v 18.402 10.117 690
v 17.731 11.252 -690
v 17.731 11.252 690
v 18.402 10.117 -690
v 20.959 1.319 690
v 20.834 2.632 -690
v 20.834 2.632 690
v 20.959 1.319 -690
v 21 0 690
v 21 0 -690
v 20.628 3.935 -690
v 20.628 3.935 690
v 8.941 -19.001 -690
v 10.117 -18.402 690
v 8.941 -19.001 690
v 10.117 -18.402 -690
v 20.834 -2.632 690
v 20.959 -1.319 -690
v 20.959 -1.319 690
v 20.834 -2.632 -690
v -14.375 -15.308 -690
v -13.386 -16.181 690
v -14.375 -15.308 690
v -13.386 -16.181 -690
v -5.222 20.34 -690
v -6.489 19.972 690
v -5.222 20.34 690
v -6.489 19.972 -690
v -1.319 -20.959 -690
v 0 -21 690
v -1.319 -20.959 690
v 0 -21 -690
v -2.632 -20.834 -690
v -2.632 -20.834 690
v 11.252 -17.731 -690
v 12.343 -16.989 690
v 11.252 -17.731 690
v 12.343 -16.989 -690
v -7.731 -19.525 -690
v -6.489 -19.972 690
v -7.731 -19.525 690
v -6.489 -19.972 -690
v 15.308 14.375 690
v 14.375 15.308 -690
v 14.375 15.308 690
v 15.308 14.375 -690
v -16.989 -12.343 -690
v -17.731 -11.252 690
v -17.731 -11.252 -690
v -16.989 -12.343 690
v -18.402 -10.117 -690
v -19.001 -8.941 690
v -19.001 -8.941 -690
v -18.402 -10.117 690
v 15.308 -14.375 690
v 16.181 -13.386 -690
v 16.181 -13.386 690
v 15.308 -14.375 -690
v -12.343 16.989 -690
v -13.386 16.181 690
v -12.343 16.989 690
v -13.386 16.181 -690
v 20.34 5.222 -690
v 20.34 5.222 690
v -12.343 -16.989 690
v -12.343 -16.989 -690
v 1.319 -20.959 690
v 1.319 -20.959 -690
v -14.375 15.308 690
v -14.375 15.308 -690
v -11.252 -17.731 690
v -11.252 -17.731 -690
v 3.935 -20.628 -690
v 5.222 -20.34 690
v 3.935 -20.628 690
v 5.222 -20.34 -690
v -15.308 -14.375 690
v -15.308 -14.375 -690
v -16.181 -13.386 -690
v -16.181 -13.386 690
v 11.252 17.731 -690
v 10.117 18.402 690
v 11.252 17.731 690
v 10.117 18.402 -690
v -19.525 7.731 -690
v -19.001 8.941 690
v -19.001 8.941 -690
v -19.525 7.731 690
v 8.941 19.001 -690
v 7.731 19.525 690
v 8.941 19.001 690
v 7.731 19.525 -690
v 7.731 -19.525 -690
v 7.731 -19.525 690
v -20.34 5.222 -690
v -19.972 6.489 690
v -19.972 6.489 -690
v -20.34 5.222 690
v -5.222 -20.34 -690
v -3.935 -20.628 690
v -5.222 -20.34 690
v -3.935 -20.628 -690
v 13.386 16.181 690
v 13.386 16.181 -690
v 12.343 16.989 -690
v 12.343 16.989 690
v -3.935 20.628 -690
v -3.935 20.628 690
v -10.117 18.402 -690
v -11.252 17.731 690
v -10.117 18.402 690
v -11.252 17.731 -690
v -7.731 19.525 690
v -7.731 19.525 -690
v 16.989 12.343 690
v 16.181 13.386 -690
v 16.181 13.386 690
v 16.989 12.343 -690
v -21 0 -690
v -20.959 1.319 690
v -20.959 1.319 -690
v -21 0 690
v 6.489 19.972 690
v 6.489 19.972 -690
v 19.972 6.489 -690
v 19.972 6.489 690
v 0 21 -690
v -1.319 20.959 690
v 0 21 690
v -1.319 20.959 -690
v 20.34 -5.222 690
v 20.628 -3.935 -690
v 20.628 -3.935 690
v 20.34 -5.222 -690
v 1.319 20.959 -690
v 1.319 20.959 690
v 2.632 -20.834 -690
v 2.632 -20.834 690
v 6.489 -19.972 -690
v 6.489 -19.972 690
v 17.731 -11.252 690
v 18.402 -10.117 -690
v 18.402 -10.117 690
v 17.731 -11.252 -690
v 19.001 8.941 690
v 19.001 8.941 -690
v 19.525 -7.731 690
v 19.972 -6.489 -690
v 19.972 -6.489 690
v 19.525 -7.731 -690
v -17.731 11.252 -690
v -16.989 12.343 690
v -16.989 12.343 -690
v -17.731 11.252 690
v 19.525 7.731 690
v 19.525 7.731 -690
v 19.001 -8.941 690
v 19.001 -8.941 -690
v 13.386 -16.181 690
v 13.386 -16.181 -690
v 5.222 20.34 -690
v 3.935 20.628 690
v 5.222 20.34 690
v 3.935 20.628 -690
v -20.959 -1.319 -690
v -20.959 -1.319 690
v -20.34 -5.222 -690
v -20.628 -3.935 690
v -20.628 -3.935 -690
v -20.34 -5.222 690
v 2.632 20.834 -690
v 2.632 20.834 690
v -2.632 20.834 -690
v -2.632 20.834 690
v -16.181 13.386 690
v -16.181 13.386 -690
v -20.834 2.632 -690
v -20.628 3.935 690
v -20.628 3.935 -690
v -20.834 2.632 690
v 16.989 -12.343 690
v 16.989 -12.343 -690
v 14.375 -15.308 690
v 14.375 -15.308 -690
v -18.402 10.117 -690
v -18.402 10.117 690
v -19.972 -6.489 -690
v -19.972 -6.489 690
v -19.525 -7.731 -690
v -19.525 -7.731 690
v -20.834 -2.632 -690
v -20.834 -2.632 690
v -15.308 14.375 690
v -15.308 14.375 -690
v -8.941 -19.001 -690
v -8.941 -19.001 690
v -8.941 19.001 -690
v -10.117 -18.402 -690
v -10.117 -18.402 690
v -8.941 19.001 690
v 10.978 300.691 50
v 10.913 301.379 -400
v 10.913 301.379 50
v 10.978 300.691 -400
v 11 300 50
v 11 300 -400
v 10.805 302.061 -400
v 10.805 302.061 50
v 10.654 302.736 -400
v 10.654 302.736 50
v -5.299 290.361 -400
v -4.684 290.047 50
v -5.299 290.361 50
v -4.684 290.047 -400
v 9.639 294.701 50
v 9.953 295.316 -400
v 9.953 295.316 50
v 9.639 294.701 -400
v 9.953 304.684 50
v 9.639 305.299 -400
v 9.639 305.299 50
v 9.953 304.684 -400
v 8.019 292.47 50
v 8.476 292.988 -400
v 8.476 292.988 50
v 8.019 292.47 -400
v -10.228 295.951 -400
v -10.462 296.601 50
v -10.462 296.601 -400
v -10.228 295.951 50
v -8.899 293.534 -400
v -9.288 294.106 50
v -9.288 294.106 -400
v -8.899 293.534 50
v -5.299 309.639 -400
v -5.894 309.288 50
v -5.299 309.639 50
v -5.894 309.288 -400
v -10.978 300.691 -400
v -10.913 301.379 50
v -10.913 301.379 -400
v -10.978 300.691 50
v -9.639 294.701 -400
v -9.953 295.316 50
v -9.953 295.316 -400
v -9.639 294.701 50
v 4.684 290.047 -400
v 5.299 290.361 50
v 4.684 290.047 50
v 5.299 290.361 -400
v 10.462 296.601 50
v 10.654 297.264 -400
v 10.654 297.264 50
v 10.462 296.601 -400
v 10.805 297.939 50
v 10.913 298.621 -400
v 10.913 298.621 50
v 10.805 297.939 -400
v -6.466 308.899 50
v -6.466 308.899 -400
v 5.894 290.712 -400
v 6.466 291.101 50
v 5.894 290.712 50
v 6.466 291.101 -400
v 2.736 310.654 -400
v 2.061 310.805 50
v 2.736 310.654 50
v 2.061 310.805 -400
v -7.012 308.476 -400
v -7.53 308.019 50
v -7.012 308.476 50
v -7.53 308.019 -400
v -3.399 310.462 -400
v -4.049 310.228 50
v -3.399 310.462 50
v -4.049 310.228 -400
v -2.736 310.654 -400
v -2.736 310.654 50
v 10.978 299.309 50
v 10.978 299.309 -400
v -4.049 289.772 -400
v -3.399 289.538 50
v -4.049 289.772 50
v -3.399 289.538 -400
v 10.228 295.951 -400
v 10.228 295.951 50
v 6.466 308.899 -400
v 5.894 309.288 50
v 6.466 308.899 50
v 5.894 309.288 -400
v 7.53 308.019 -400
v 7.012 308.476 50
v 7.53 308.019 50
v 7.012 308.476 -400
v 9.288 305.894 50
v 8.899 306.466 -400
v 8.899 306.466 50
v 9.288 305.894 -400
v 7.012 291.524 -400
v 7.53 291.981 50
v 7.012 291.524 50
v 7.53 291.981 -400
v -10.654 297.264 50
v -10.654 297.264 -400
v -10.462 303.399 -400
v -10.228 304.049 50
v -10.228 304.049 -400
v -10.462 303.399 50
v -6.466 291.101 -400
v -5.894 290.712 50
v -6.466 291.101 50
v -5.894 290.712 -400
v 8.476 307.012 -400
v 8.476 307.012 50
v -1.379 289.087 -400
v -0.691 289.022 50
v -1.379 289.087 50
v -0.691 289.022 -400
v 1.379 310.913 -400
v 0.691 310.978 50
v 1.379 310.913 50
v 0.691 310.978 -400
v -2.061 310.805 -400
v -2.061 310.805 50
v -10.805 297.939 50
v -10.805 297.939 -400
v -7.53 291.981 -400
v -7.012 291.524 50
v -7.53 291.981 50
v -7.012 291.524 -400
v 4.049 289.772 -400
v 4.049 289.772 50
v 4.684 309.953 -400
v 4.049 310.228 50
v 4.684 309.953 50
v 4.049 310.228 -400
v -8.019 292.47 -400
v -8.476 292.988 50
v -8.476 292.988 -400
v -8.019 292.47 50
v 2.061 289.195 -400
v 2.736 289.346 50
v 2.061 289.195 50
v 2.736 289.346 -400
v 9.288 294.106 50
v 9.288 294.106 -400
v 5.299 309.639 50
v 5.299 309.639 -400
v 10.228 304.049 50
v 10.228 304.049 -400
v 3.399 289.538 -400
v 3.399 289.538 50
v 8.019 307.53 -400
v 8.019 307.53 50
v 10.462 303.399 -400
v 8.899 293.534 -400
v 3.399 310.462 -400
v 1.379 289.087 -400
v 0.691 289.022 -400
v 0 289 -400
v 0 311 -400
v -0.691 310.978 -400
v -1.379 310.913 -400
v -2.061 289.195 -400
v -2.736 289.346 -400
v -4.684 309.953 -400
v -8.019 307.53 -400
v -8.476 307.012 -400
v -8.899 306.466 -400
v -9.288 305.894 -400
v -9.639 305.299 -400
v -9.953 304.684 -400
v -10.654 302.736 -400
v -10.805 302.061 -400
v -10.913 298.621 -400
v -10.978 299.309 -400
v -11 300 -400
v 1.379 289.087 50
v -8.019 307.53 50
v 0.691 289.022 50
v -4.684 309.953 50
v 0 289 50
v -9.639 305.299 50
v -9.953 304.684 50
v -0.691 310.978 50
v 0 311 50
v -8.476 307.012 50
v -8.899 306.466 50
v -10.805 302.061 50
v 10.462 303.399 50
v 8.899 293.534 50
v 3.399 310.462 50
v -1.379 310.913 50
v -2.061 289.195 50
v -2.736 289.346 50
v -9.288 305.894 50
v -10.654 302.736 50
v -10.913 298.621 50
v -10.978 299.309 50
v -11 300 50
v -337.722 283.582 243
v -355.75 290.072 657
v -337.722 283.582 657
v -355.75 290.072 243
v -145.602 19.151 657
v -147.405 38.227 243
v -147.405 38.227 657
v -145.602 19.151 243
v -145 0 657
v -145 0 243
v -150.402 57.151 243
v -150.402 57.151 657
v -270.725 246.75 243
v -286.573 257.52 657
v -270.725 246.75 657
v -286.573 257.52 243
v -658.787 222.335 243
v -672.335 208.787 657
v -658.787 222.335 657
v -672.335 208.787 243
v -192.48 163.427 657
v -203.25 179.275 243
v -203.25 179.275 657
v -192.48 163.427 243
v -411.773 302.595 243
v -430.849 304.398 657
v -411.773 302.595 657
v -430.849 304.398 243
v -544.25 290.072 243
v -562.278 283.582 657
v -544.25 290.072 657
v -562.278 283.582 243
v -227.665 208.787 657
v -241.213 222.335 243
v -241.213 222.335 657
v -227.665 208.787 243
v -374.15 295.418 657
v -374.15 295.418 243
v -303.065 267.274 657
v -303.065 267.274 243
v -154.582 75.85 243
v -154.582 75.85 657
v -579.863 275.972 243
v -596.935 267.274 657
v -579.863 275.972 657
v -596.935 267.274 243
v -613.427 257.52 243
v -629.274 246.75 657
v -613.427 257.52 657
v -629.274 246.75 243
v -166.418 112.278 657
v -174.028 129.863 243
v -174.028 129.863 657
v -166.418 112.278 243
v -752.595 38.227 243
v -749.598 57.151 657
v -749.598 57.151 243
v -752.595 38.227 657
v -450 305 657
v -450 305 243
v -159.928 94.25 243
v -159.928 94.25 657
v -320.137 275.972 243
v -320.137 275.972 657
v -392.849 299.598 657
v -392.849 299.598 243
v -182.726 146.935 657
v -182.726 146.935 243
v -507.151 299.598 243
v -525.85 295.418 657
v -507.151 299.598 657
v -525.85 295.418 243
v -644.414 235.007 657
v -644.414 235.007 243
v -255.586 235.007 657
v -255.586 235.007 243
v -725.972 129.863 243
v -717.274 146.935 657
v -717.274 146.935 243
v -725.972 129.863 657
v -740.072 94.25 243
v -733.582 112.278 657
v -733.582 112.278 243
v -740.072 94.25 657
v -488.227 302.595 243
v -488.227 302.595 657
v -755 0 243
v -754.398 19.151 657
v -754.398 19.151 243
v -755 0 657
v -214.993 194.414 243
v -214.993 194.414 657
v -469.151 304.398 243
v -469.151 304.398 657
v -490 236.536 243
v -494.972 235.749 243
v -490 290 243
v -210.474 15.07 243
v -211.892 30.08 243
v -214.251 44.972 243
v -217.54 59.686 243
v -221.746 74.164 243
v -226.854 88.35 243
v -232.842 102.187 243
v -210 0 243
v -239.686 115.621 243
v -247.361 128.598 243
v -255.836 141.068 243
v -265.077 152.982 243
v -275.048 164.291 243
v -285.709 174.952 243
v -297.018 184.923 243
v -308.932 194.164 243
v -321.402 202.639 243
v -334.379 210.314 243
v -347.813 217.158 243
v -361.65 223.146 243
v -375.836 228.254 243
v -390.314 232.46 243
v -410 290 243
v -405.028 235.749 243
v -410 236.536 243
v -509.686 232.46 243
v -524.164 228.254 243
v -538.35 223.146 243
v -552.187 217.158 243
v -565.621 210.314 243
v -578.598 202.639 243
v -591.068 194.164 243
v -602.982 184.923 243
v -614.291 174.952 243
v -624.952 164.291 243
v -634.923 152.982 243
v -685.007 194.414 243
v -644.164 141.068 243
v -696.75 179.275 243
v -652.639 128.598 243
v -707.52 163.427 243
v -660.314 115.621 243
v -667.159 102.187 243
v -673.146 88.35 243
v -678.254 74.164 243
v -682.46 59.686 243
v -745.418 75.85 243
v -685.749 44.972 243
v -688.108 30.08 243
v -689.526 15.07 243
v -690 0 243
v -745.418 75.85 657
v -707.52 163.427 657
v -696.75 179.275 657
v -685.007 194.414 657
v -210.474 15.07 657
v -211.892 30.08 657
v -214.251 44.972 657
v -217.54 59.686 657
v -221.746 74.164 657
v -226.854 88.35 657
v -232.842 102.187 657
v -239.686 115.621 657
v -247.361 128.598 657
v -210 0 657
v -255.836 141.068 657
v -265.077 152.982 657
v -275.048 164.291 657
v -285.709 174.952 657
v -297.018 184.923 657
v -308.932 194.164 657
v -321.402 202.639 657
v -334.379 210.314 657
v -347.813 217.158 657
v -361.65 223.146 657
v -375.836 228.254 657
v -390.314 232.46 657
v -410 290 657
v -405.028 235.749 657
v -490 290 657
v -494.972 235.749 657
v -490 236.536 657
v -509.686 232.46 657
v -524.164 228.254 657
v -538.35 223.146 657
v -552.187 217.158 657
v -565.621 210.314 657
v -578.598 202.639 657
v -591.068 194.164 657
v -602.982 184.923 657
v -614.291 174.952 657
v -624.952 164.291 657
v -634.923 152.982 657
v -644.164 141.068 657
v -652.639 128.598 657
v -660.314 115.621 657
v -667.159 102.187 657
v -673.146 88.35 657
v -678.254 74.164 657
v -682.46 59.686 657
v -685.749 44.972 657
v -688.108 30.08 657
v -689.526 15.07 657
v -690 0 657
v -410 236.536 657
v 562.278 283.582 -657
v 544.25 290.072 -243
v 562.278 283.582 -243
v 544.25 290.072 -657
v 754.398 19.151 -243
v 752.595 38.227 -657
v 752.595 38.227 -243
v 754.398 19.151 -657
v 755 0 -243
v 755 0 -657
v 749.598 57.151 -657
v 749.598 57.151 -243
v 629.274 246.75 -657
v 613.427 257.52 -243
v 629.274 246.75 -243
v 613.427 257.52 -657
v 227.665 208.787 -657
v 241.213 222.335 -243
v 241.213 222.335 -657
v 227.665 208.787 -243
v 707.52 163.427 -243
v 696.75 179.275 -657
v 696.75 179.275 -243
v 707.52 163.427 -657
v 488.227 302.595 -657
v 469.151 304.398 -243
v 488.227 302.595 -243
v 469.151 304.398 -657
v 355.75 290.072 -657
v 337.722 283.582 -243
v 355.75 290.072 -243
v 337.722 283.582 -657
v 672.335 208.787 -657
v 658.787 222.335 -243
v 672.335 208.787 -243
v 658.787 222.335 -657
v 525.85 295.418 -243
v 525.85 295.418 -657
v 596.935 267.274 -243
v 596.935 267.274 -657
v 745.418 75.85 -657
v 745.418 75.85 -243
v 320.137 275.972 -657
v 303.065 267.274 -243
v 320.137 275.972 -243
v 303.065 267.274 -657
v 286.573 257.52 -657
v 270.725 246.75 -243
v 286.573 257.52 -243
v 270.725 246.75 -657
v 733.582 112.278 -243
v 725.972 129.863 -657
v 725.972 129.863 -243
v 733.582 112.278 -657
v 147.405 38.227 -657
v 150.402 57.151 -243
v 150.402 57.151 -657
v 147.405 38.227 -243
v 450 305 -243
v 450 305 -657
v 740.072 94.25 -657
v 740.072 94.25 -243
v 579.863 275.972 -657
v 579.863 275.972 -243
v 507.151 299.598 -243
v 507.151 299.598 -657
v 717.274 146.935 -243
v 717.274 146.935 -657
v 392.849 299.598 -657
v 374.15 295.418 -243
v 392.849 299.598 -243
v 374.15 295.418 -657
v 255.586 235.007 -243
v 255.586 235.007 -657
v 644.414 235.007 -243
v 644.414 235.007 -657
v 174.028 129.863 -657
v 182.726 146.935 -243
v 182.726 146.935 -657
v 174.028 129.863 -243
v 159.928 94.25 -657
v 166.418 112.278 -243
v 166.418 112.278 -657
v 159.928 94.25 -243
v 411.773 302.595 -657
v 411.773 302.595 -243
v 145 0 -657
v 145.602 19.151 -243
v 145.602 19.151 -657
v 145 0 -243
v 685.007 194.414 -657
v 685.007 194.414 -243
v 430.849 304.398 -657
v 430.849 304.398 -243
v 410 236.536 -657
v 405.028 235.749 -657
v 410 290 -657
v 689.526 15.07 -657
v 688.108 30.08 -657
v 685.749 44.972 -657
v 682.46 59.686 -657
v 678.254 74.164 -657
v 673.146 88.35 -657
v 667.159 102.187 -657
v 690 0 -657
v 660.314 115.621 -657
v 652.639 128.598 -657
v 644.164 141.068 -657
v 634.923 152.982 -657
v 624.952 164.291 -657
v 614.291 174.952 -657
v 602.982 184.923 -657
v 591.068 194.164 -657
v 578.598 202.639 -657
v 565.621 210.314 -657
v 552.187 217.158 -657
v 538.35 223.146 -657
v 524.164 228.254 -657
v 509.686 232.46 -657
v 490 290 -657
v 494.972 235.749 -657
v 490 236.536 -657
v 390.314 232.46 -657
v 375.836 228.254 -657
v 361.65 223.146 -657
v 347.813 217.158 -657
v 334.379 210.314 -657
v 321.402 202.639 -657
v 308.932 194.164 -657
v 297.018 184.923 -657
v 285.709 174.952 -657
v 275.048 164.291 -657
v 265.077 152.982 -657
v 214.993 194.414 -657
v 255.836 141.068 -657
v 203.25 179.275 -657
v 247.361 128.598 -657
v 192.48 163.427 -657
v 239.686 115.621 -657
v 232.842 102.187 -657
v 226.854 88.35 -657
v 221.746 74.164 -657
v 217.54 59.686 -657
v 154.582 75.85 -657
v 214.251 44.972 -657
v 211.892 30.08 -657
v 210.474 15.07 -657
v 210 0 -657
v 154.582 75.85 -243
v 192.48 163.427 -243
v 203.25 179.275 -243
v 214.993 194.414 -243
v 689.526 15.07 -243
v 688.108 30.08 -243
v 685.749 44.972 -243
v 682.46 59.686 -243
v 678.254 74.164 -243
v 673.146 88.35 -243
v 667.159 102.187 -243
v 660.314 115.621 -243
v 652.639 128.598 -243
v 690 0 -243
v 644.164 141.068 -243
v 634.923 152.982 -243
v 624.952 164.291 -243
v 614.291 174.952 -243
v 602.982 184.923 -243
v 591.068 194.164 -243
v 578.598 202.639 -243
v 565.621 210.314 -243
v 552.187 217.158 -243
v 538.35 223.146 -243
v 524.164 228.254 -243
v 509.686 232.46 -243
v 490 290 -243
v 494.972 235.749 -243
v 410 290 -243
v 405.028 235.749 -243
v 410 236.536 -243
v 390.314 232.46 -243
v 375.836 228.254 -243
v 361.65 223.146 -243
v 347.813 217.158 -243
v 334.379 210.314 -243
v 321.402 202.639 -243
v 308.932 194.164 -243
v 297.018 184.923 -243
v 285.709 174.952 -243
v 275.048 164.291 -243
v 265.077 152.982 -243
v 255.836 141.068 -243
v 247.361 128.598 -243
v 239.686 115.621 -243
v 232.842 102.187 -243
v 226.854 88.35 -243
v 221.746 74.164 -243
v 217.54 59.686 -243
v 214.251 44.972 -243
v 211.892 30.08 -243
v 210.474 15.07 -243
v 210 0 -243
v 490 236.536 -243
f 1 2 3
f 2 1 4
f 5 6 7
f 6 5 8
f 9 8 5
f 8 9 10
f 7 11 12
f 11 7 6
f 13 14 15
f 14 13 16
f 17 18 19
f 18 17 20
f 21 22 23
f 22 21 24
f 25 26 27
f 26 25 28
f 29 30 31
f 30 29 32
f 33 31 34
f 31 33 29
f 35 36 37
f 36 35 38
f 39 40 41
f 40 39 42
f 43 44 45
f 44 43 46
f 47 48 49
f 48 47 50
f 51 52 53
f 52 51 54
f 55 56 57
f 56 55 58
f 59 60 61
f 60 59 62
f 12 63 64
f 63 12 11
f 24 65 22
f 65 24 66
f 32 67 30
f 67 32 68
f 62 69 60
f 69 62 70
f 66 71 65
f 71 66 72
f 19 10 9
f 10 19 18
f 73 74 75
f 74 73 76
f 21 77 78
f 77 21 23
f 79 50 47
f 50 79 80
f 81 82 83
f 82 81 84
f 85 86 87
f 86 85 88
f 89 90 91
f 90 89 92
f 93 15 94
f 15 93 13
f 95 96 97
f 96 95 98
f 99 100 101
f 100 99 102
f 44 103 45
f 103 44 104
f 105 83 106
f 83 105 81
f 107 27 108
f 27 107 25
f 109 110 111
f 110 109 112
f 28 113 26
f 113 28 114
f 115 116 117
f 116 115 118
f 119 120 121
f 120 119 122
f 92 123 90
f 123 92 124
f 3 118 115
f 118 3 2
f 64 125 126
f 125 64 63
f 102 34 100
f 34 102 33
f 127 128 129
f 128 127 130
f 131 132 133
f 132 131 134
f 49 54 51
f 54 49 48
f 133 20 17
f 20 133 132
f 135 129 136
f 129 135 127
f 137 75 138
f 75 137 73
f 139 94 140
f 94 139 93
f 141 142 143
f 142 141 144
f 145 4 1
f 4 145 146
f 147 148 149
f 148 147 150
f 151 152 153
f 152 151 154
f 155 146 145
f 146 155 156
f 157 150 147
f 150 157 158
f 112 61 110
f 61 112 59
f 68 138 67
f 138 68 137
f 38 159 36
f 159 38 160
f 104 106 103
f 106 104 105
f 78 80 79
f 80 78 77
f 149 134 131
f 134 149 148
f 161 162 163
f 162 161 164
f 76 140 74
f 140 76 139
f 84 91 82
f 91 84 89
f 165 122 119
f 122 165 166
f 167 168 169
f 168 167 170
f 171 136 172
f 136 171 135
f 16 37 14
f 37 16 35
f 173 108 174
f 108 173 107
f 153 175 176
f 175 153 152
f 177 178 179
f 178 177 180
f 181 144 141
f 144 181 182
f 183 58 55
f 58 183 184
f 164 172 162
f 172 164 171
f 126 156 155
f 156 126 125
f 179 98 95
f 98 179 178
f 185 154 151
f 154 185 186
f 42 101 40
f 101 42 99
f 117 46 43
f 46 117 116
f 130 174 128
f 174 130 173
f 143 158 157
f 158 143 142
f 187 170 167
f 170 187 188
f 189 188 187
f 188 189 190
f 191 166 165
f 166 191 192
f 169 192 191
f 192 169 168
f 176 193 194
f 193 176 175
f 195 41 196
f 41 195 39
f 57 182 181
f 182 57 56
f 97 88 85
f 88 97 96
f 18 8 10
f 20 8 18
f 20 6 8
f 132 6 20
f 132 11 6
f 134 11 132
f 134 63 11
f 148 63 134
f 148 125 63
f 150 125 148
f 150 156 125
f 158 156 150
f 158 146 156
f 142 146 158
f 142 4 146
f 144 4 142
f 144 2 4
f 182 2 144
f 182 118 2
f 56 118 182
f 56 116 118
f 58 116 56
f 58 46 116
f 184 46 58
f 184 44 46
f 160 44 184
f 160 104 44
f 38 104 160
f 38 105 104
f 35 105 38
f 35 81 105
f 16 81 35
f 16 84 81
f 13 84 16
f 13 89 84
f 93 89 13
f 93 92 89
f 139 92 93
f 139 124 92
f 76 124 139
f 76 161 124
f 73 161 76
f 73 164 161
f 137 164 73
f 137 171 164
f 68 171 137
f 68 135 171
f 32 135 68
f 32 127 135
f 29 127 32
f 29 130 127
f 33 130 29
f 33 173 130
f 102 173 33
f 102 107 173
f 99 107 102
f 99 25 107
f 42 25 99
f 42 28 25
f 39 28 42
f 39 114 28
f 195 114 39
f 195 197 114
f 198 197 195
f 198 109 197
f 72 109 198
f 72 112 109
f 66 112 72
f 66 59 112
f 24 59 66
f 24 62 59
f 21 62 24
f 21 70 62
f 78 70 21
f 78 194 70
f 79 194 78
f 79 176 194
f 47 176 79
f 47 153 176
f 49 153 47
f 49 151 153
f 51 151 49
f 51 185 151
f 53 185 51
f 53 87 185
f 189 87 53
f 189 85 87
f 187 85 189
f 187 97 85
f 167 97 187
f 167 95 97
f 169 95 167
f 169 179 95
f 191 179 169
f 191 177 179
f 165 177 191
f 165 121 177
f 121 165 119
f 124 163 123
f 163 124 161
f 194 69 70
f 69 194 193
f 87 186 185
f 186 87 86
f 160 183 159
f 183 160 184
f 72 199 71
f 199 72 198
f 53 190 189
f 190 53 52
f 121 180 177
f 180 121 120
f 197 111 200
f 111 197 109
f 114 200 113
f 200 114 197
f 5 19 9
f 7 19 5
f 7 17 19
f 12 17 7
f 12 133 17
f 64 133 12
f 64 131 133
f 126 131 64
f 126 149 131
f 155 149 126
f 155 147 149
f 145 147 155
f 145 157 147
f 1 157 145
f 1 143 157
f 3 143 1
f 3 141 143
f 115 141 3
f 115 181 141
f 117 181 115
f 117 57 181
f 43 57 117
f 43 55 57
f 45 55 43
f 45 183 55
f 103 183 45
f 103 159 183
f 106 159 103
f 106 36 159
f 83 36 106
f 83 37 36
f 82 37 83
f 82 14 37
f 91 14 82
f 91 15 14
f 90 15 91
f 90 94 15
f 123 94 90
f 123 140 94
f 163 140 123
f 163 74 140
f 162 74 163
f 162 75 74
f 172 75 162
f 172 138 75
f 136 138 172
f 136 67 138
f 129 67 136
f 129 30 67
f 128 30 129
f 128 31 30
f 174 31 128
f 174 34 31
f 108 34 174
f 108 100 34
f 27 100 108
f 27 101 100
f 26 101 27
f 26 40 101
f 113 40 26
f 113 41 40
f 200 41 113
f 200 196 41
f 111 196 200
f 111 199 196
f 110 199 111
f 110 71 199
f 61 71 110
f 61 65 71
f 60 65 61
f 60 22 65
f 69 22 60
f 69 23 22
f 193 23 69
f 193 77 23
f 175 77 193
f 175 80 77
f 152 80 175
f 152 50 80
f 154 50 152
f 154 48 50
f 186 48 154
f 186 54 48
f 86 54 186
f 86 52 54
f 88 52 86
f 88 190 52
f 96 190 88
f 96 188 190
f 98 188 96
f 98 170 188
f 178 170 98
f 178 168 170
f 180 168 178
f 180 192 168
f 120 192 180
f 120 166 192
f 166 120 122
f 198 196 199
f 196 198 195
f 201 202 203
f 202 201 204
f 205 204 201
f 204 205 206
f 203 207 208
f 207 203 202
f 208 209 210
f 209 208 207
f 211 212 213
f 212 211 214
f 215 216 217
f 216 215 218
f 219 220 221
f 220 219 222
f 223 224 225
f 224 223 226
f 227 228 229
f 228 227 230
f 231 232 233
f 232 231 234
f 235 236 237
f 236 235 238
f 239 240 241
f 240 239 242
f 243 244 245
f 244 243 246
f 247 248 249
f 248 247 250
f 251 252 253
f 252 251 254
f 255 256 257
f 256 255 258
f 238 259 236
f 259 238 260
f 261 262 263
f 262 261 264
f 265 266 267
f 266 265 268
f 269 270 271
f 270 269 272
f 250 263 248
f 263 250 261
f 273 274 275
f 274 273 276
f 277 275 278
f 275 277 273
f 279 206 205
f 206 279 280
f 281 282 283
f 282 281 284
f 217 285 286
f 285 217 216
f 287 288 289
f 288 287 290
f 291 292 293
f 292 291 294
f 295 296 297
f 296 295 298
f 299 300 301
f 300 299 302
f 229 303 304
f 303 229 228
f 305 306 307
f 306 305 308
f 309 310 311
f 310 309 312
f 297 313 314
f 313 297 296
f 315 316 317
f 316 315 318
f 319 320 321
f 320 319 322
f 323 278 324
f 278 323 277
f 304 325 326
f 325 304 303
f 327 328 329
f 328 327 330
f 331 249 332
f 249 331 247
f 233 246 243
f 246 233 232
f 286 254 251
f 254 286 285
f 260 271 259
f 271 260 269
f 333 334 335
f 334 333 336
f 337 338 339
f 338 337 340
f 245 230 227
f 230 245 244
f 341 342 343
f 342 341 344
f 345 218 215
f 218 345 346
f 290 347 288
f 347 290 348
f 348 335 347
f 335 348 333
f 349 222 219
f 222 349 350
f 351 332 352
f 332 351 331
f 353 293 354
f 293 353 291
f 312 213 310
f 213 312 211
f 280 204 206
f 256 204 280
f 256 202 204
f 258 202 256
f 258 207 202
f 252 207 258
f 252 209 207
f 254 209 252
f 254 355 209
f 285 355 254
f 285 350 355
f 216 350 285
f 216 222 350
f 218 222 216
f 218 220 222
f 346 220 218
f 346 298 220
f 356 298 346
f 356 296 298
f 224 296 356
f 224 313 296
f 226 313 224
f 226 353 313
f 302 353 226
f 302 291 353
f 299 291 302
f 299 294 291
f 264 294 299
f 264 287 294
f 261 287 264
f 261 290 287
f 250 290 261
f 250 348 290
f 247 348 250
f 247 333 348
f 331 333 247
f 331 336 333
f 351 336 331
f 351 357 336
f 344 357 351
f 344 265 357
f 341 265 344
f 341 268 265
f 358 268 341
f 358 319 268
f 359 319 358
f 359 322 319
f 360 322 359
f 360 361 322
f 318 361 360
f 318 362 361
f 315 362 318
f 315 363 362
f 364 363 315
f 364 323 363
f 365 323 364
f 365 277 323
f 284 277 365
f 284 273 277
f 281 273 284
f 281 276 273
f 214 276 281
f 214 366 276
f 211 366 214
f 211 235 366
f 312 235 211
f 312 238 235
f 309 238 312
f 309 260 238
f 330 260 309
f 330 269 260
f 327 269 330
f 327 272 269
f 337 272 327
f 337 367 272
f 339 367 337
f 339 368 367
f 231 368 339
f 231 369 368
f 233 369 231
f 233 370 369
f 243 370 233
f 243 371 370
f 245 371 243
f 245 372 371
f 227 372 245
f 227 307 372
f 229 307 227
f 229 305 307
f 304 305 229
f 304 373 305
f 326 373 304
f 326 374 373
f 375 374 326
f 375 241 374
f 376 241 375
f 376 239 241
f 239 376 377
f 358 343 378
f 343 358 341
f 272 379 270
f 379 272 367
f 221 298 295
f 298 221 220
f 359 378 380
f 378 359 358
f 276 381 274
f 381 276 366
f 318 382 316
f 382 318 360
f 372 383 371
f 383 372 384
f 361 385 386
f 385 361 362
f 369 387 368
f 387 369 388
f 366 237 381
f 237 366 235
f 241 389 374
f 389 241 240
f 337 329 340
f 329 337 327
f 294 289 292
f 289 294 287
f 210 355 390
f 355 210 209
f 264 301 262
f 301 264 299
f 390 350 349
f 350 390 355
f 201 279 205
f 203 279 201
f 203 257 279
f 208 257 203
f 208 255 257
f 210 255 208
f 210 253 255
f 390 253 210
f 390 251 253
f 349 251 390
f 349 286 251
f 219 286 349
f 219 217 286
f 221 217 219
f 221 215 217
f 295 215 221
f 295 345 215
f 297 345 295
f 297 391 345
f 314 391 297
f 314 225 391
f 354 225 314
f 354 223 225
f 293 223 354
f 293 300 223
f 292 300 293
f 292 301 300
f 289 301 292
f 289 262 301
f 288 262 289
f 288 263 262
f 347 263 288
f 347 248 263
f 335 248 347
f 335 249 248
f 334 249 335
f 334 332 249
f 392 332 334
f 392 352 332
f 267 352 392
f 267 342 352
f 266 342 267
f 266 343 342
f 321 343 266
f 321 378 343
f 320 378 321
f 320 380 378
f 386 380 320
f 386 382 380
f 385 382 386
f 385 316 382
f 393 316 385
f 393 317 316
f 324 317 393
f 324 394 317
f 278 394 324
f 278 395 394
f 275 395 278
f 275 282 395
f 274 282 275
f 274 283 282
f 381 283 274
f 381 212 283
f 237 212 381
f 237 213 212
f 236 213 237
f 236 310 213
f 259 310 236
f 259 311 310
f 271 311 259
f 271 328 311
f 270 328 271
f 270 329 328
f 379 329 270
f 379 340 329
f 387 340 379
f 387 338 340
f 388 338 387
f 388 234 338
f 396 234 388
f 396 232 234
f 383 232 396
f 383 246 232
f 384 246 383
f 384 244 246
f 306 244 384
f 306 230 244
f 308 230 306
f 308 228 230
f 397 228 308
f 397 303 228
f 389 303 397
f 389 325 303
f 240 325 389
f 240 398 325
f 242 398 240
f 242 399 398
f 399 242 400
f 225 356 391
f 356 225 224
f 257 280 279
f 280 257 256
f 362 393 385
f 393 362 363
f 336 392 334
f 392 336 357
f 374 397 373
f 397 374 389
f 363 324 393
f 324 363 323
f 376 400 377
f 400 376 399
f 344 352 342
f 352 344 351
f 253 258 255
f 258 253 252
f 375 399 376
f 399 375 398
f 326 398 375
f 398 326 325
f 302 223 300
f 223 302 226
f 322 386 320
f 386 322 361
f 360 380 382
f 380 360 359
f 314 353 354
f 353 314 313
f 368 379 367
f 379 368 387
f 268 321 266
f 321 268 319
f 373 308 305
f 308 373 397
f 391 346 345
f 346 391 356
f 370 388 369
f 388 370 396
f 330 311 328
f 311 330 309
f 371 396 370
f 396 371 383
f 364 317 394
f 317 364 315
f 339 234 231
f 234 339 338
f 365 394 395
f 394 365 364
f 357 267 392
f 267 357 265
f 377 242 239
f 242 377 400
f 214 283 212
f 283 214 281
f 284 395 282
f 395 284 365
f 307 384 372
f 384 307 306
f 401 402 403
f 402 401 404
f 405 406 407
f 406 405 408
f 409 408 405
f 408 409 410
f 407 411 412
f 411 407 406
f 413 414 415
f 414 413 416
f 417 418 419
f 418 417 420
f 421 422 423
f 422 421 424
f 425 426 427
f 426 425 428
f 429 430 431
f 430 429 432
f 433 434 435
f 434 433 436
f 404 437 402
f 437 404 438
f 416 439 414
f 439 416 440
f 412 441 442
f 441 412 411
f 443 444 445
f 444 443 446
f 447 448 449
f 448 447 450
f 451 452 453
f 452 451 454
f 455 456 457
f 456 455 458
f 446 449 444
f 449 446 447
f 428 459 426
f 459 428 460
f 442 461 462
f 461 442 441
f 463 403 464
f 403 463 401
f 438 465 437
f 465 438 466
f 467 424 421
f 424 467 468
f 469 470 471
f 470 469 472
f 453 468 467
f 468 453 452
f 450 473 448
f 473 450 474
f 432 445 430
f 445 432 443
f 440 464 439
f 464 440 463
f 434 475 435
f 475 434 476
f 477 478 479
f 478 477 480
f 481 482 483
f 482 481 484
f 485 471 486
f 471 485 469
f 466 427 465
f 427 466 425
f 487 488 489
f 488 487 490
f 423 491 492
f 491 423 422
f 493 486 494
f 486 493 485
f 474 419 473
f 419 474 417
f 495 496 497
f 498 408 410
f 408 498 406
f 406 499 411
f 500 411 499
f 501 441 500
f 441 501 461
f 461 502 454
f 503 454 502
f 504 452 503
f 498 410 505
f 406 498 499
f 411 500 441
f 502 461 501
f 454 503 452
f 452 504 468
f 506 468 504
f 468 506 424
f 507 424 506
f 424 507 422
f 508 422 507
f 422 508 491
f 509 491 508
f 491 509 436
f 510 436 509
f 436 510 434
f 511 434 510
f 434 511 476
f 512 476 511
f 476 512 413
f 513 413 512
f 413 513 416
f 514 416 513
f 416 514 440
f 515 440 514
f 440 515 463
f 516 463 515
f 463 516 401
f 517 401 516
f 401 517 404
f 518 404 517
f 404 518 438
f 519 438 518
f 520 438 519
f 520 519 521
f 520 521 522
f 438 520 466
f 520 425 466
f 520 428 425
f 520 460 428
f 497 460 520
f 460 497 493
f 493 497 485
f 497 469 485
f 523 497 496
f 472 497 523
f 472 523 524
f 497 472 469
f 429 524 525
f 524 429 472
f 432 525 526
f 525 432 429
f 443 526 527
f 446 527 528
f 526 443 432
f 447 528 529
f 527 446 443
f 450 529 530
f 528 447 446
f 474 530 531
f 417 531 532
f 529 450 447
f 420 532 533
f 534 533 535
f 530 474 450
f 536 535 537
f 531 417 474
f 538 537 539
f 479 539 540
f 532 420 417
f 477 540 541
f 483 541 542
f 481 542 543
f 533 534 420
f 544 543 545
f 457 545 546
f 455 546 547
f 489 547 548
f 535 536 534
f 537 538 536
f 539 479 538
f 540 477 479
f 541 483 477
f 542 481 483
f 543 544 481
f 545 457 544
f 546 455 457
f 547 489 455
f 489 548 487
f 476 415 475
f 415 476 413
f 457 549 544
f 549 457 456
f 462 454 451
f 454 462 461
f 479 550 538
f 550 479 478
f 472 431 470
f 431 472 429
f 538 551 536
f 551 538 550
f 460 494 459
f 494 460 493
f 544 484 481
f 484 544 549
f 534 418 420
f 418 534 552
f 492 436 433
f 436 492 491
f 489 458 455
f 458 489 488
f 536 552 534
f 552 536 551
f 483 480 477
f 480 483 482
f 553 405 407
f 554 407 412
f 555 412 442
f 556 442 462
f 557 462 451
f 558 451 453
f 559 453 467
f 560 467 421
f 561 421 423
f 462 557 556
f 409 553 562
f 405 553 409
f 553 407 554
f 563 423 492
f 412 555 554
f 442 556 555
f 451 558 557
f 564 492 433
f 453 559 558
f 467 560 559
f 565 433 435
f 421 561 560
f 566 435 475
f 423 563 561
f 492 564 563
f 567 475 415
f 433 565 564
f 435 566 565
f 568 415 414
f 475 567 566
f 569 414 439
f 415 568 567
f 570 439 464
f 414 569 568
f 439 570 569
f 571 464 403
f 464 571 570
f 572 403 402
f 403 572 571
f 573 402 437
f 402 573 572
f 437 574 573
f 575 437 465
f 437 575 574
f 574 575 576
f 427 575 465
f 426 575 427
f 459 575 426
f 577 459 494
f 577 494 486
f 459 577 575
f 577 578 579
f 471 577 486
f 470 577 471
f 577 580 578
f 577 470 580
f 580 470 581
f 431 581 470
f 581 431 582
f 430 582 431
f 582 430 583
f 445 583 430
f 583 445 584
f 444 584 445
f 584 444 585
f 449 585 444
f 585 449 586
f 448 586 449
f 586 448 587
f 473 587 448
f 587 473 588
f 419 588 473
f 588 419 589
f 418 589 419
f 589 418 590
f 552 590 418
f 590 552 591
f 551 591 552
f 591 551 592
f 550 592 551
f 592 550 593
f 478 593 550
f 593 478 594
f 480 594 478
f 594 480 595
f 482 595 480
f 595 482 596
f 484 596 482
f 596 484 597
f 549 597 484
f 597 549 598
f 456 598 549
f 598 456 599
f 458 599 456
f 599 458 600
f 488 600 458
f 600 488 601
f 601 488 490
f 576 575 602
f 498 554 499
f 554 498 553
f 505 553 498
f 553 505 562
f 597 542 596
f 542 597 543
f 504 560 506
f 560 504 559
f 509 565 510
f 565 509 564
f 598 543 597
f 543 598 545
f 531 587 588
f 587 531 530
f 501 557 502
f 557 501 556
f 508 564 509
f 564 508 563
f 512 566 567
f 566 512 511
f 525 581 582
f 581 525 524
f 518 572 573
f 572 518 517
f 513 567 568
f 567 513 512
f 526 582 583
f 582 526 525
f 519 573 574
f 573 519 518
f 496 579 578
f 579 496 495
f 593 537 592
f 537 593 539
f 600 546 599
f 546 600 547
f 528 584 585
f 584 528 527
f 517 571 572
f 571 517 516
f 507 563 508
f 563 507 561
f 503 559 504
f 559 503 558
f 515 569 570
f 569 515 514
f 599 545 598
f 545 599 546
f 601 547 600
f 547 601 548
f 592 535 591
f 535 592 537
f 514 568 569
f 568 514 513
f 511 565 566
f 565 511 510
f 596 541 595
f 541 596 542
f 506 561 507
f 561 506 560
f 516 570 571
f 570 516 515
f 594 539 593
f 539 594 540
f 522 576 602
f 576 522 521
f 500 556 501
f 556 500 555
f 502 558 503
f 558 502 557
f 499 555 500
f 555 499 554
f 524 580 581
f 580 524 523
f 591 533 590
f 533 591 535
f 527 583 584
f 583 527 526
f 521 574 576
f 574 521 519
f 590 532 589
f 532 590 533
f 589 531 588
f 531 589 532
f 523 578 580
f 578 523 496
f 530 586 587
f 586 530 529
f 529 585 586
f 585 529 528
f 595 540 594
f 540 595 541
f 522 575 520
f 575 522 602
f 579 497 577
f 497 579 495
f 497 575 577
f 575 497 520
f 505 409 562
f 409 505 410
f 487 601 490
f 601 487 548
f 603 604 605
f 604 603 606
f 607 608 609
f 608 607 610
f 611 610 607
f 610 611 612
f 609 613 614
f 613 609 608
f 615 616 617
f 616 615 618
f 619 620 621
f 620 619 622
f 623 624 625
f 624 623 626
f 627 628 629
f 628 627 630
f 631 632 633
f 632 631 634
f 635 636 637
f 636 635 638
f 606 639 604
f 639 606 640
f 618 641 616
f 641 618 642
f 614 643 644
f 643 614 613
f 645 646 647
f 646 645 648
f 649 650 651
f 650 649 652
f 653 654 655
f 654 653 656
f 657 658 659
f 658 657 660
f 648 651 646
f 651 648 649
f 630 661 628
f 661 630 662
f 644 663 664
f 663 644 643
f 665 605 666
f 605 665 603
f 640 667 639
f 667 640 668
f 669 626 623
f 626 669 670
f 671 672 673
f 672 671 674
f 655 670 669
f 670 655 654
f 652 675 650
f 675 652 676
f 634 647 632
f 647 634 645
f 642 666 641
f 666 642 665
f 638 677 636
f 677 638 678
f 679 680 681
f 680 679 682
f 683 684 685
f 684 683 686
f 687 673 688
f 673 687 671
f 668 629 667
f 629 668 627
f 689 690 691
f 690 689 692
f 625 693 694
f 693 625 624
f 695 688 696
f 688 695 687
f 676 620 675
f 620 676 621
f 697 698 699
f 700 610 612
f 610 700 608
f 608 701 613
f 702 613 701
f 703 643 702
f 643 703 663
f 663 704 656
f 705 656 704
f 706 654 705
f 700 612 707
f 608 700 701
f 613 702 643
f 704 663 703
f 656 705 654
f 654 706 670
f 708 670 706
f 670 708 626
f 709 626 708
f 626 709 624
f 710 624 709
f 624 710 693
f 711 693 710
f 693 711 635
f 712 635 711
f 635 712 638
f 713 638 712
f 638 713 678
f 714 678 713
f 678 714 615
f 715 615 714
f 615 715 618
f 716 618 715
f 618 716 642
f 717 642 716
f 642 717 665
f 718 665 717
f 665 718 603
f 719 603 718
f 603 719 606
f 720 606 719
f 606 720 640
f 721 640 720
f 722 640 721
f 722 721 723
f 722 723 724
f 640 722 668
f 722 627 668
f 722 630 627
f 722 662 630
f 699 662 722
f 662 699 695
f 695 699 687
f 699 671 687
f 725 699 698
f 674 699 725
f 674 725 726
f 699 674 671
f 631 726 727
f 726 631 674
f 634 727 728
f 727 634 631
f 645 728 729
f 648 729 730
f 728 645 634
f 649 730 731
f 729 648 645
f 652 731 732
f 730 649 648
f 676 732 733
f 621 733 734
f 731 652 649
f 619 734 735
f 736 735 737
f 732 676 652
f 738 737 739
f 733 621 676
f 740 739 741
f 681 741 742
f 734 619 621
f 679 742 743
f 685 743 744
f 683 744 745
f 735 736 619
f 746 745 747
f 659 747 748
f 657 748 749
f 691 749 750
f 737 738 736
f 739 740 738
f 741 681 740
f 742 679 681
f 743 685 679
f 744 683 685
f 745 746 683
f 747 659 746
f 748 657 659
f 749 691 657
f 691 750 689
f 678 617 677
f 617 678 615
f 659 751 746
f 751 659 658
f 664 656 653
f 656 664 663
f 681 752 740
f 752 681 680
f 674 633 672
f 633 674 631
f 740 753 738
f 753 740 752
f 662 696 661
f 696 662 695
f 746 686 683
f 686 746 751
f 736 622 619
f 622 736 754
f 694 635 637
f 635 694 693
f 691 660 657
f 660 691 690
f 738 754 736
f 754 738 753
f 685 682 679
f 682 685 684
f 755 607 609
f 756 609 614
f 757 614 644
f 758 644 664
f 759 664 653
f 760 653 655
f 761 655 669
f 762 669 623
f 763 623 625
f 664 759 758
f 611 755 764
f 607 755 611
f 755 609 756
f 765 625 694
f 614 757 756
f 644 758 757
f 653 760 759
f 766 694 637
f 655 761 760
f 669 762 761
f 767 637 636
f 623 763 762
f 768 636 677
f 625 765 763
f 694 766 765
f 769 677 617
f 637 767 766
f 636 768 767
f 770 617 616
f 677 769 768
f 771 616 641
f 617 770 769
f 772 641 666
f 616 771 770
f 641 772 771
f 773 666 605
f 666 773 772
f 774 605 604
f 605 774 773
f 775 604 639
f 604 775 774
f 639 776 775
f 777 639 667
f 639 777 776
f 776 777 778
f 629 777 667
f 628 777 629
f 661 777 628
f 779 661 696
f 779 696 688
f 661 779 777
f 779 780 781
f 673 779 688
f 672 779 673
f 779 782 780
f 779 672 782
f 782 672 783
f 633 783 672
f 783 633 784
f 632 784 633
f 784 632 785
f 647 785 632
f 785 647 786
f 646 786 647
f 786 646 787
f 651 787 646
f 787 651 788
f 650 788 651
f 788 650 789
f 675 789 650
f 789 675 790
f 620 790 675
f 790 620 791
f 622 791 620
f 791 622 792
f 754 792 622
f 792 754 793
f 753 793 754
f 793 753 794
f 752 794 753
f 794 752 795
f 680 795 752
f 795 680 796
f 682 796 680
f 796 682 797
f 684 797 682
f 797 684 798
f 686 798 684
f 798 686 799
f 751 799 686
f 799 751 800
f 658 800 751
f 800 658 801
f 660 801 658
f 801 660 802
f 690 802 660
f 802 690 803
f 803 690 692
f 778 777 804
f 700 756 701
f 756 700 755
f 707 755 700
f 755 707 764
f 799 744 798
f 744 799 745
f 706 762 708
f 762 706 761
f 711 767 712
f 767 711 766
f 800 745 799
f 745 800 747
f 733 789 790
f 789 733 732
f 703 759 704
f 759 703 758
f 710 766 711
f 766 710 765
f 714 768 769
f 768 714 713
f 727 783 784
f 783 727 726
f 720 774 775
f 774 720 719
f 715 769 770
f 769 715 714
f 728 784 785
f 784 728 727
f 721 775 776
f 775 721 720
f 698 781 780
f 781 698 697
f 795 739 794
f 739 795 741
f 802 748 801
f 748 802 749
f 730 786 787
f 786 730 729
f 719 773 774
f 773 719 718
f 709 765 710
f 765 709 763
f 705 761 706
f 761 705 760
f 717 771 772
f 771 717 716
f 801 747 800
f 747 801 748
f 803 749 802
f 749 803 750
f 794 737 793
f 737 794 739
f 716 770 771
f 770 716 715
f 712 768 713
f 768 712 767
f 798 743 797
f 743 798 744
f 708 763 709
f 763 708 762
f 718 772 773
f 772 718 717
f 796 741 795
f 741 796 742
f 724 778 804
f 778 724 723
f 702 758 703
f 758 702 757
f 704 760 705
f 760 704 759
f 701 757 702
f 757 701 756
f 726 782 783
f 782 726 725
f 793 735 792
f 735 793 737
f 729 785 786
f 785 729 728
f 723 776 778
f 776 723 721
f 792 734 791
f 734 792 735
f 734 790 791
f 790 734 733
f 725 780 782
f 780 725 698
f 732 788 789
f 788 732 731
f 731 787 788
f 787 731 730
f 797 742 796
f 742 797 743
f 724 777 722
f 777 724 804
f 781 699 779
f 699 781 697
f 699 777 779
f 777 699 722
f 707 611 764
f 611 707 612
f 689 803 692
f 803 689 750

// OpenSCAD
// ============================================================================
// PROJECT: XXXG-00W0 WING GUNDAM ZERO EW - SHOULDER INNER BACKBONE INFRA
// COMPONENT VAULT: BANDAI CAST RUNNER G - SHOULDER BLOCKS G11 & G12
// PACKAGING RE-ARCHITECTURE: SUB-ARMOR CAPACITOR RECESSED BANK INTEGRATION
// CONFIG METRIC: SCALED TITANIUM CASTS (1:1 ACTUAL METRIC UP-SCALE)
// ============================================================================

$fn = 100; // High-precision circular resolution segment count

// Structural Constants Scaled 1:1 for a 16.7-Meter Airframe Scale (mm)
block_total_length = 920;                // Total longitudinal vertical height (mm)
pivot_bore_diameter = 480;               // Core cycloidal stabilizer pin width (mm)
armor_skin_thickness = 65;              // Solid TiAl protective plating wall (mm)
harness_conduit_width = 80;             // Cast-in 4oz copper logic trace track (mm)
capacitor_pocket_depth = 15;            // Sub-armor recessed housing pocket depth (mm)
capacitor_pocket_width = 140;           // Transverse MLCC array pocket width (mm)

module Runner_G_Shoulder_Block_Forge() {
    // Central Supply Injection Runner Axis (Molten Feed Line from Siphon Forge)
    color([0.22, 0.22, 0.25]) {
        cylinder(h = block_total_length * 1.5, d = 42, center = true);
        // Direct injection gates tracking straight into the part mold cavities
        translate() rotate() cylinder(h = 450, d = 22);
        translate([0, 300, -400]) rotate() cylinder(h = 450, d = 22);
    }
    
    // Instantiate Scaled Skeutomorphic Part Molds Symmetrically (Left & Right)
    Cast_Internal_Shoulder_Blocks();
}

module Cast_Internal_Shoulder_Blocks() {
    // ---- PART G11: INTERNAL LEFT STRUCTURAL UPPER SHOULDER ARTICULATION BLOCK ----
    translate([-450, 0, 450]) color([0.35, 0.35, 0.38]) { // Inner Frame Dark Spec
        difference() {
            // Main solid heavy-duty core joint connection block segment
            cylinder(h = block_total_length * 0.45, d = pivot_bore_diameter + (armor_skin_thickness * 2), center = true);
            
            // Central Cycloidal Reduction Track Bore (Houses pre-loaded alignment pins)
            cylinder(h = block_total_length * 0.5, d = pivot_bore_diameter, center = true);
            
            // SUB-ARMOR RECESSED CAPACITOR POCKETS [Segmented rows cut inside the armor inner wall]
            for (z_offset = [-120, 0, 120]) {
                translate([0, (pivot_bore_diameter/2 - armor_skin_thickness + capacitor_pocket_depth/2), z_offset])
                    cube([capacitor_pocket_width, capacitor_pocket_depth, 100], center = true);
            }
            
            // Continuous cast-in routing track for the 4oz solid-state wiring rails
            cube([harness_conduit_width, pivot_bore_diameter + 100, block_total_length], center = true);
            
            // Slicing profile tool to generate an asymmetrical half-shell part component
            translate([0, -pivot_bore_diameter, 0])
                cube([pivot_bore_diameter * 2, pivot_bore_diameter * 2, block_total_length * 2], center = true);
        }
    }
    
    // ---- PART G12: INTERNAL RIGHT STRUCTURAL UPPER SHOULDER ARTICULATION BLOCK ----
    translate([450, 0, -450]) rotate() color([0.35, 0.35, 0.38]) {
        difference() {
            cylinder(h = block_total_length * 0.45, d = pivot_bore_diameter + (armor_skin_thickness * 2), center = true);
            cylinder(h = block_total_length * 0.5, d = pivot_bore_diameter, center = true);
            
            for (z_offset = [-120, 0, 120]) {
                translate([0, (pivot_bore_diameter/2 - armor_skin_thickness + capacitor_pocket_depth/2), z_offset])
                    cube([capacitor_pocket_width, capacitor_pocket_depth, 100], center = true);
            }
            
            cube([harness_conduit_width, pivot_bore_diameter + 100, block_total_length], center = true);
            translate([0, -pivot_bore_diameter, 0])
                cube([pivot_bore_diameter * 2, pivot_bore_diameter * 2, block_total_length * 2], center = true);
        }
    }
}

// Render Master Assembly to Parameter Workspace
Runner_G_Shoulder_Block_Forge();
